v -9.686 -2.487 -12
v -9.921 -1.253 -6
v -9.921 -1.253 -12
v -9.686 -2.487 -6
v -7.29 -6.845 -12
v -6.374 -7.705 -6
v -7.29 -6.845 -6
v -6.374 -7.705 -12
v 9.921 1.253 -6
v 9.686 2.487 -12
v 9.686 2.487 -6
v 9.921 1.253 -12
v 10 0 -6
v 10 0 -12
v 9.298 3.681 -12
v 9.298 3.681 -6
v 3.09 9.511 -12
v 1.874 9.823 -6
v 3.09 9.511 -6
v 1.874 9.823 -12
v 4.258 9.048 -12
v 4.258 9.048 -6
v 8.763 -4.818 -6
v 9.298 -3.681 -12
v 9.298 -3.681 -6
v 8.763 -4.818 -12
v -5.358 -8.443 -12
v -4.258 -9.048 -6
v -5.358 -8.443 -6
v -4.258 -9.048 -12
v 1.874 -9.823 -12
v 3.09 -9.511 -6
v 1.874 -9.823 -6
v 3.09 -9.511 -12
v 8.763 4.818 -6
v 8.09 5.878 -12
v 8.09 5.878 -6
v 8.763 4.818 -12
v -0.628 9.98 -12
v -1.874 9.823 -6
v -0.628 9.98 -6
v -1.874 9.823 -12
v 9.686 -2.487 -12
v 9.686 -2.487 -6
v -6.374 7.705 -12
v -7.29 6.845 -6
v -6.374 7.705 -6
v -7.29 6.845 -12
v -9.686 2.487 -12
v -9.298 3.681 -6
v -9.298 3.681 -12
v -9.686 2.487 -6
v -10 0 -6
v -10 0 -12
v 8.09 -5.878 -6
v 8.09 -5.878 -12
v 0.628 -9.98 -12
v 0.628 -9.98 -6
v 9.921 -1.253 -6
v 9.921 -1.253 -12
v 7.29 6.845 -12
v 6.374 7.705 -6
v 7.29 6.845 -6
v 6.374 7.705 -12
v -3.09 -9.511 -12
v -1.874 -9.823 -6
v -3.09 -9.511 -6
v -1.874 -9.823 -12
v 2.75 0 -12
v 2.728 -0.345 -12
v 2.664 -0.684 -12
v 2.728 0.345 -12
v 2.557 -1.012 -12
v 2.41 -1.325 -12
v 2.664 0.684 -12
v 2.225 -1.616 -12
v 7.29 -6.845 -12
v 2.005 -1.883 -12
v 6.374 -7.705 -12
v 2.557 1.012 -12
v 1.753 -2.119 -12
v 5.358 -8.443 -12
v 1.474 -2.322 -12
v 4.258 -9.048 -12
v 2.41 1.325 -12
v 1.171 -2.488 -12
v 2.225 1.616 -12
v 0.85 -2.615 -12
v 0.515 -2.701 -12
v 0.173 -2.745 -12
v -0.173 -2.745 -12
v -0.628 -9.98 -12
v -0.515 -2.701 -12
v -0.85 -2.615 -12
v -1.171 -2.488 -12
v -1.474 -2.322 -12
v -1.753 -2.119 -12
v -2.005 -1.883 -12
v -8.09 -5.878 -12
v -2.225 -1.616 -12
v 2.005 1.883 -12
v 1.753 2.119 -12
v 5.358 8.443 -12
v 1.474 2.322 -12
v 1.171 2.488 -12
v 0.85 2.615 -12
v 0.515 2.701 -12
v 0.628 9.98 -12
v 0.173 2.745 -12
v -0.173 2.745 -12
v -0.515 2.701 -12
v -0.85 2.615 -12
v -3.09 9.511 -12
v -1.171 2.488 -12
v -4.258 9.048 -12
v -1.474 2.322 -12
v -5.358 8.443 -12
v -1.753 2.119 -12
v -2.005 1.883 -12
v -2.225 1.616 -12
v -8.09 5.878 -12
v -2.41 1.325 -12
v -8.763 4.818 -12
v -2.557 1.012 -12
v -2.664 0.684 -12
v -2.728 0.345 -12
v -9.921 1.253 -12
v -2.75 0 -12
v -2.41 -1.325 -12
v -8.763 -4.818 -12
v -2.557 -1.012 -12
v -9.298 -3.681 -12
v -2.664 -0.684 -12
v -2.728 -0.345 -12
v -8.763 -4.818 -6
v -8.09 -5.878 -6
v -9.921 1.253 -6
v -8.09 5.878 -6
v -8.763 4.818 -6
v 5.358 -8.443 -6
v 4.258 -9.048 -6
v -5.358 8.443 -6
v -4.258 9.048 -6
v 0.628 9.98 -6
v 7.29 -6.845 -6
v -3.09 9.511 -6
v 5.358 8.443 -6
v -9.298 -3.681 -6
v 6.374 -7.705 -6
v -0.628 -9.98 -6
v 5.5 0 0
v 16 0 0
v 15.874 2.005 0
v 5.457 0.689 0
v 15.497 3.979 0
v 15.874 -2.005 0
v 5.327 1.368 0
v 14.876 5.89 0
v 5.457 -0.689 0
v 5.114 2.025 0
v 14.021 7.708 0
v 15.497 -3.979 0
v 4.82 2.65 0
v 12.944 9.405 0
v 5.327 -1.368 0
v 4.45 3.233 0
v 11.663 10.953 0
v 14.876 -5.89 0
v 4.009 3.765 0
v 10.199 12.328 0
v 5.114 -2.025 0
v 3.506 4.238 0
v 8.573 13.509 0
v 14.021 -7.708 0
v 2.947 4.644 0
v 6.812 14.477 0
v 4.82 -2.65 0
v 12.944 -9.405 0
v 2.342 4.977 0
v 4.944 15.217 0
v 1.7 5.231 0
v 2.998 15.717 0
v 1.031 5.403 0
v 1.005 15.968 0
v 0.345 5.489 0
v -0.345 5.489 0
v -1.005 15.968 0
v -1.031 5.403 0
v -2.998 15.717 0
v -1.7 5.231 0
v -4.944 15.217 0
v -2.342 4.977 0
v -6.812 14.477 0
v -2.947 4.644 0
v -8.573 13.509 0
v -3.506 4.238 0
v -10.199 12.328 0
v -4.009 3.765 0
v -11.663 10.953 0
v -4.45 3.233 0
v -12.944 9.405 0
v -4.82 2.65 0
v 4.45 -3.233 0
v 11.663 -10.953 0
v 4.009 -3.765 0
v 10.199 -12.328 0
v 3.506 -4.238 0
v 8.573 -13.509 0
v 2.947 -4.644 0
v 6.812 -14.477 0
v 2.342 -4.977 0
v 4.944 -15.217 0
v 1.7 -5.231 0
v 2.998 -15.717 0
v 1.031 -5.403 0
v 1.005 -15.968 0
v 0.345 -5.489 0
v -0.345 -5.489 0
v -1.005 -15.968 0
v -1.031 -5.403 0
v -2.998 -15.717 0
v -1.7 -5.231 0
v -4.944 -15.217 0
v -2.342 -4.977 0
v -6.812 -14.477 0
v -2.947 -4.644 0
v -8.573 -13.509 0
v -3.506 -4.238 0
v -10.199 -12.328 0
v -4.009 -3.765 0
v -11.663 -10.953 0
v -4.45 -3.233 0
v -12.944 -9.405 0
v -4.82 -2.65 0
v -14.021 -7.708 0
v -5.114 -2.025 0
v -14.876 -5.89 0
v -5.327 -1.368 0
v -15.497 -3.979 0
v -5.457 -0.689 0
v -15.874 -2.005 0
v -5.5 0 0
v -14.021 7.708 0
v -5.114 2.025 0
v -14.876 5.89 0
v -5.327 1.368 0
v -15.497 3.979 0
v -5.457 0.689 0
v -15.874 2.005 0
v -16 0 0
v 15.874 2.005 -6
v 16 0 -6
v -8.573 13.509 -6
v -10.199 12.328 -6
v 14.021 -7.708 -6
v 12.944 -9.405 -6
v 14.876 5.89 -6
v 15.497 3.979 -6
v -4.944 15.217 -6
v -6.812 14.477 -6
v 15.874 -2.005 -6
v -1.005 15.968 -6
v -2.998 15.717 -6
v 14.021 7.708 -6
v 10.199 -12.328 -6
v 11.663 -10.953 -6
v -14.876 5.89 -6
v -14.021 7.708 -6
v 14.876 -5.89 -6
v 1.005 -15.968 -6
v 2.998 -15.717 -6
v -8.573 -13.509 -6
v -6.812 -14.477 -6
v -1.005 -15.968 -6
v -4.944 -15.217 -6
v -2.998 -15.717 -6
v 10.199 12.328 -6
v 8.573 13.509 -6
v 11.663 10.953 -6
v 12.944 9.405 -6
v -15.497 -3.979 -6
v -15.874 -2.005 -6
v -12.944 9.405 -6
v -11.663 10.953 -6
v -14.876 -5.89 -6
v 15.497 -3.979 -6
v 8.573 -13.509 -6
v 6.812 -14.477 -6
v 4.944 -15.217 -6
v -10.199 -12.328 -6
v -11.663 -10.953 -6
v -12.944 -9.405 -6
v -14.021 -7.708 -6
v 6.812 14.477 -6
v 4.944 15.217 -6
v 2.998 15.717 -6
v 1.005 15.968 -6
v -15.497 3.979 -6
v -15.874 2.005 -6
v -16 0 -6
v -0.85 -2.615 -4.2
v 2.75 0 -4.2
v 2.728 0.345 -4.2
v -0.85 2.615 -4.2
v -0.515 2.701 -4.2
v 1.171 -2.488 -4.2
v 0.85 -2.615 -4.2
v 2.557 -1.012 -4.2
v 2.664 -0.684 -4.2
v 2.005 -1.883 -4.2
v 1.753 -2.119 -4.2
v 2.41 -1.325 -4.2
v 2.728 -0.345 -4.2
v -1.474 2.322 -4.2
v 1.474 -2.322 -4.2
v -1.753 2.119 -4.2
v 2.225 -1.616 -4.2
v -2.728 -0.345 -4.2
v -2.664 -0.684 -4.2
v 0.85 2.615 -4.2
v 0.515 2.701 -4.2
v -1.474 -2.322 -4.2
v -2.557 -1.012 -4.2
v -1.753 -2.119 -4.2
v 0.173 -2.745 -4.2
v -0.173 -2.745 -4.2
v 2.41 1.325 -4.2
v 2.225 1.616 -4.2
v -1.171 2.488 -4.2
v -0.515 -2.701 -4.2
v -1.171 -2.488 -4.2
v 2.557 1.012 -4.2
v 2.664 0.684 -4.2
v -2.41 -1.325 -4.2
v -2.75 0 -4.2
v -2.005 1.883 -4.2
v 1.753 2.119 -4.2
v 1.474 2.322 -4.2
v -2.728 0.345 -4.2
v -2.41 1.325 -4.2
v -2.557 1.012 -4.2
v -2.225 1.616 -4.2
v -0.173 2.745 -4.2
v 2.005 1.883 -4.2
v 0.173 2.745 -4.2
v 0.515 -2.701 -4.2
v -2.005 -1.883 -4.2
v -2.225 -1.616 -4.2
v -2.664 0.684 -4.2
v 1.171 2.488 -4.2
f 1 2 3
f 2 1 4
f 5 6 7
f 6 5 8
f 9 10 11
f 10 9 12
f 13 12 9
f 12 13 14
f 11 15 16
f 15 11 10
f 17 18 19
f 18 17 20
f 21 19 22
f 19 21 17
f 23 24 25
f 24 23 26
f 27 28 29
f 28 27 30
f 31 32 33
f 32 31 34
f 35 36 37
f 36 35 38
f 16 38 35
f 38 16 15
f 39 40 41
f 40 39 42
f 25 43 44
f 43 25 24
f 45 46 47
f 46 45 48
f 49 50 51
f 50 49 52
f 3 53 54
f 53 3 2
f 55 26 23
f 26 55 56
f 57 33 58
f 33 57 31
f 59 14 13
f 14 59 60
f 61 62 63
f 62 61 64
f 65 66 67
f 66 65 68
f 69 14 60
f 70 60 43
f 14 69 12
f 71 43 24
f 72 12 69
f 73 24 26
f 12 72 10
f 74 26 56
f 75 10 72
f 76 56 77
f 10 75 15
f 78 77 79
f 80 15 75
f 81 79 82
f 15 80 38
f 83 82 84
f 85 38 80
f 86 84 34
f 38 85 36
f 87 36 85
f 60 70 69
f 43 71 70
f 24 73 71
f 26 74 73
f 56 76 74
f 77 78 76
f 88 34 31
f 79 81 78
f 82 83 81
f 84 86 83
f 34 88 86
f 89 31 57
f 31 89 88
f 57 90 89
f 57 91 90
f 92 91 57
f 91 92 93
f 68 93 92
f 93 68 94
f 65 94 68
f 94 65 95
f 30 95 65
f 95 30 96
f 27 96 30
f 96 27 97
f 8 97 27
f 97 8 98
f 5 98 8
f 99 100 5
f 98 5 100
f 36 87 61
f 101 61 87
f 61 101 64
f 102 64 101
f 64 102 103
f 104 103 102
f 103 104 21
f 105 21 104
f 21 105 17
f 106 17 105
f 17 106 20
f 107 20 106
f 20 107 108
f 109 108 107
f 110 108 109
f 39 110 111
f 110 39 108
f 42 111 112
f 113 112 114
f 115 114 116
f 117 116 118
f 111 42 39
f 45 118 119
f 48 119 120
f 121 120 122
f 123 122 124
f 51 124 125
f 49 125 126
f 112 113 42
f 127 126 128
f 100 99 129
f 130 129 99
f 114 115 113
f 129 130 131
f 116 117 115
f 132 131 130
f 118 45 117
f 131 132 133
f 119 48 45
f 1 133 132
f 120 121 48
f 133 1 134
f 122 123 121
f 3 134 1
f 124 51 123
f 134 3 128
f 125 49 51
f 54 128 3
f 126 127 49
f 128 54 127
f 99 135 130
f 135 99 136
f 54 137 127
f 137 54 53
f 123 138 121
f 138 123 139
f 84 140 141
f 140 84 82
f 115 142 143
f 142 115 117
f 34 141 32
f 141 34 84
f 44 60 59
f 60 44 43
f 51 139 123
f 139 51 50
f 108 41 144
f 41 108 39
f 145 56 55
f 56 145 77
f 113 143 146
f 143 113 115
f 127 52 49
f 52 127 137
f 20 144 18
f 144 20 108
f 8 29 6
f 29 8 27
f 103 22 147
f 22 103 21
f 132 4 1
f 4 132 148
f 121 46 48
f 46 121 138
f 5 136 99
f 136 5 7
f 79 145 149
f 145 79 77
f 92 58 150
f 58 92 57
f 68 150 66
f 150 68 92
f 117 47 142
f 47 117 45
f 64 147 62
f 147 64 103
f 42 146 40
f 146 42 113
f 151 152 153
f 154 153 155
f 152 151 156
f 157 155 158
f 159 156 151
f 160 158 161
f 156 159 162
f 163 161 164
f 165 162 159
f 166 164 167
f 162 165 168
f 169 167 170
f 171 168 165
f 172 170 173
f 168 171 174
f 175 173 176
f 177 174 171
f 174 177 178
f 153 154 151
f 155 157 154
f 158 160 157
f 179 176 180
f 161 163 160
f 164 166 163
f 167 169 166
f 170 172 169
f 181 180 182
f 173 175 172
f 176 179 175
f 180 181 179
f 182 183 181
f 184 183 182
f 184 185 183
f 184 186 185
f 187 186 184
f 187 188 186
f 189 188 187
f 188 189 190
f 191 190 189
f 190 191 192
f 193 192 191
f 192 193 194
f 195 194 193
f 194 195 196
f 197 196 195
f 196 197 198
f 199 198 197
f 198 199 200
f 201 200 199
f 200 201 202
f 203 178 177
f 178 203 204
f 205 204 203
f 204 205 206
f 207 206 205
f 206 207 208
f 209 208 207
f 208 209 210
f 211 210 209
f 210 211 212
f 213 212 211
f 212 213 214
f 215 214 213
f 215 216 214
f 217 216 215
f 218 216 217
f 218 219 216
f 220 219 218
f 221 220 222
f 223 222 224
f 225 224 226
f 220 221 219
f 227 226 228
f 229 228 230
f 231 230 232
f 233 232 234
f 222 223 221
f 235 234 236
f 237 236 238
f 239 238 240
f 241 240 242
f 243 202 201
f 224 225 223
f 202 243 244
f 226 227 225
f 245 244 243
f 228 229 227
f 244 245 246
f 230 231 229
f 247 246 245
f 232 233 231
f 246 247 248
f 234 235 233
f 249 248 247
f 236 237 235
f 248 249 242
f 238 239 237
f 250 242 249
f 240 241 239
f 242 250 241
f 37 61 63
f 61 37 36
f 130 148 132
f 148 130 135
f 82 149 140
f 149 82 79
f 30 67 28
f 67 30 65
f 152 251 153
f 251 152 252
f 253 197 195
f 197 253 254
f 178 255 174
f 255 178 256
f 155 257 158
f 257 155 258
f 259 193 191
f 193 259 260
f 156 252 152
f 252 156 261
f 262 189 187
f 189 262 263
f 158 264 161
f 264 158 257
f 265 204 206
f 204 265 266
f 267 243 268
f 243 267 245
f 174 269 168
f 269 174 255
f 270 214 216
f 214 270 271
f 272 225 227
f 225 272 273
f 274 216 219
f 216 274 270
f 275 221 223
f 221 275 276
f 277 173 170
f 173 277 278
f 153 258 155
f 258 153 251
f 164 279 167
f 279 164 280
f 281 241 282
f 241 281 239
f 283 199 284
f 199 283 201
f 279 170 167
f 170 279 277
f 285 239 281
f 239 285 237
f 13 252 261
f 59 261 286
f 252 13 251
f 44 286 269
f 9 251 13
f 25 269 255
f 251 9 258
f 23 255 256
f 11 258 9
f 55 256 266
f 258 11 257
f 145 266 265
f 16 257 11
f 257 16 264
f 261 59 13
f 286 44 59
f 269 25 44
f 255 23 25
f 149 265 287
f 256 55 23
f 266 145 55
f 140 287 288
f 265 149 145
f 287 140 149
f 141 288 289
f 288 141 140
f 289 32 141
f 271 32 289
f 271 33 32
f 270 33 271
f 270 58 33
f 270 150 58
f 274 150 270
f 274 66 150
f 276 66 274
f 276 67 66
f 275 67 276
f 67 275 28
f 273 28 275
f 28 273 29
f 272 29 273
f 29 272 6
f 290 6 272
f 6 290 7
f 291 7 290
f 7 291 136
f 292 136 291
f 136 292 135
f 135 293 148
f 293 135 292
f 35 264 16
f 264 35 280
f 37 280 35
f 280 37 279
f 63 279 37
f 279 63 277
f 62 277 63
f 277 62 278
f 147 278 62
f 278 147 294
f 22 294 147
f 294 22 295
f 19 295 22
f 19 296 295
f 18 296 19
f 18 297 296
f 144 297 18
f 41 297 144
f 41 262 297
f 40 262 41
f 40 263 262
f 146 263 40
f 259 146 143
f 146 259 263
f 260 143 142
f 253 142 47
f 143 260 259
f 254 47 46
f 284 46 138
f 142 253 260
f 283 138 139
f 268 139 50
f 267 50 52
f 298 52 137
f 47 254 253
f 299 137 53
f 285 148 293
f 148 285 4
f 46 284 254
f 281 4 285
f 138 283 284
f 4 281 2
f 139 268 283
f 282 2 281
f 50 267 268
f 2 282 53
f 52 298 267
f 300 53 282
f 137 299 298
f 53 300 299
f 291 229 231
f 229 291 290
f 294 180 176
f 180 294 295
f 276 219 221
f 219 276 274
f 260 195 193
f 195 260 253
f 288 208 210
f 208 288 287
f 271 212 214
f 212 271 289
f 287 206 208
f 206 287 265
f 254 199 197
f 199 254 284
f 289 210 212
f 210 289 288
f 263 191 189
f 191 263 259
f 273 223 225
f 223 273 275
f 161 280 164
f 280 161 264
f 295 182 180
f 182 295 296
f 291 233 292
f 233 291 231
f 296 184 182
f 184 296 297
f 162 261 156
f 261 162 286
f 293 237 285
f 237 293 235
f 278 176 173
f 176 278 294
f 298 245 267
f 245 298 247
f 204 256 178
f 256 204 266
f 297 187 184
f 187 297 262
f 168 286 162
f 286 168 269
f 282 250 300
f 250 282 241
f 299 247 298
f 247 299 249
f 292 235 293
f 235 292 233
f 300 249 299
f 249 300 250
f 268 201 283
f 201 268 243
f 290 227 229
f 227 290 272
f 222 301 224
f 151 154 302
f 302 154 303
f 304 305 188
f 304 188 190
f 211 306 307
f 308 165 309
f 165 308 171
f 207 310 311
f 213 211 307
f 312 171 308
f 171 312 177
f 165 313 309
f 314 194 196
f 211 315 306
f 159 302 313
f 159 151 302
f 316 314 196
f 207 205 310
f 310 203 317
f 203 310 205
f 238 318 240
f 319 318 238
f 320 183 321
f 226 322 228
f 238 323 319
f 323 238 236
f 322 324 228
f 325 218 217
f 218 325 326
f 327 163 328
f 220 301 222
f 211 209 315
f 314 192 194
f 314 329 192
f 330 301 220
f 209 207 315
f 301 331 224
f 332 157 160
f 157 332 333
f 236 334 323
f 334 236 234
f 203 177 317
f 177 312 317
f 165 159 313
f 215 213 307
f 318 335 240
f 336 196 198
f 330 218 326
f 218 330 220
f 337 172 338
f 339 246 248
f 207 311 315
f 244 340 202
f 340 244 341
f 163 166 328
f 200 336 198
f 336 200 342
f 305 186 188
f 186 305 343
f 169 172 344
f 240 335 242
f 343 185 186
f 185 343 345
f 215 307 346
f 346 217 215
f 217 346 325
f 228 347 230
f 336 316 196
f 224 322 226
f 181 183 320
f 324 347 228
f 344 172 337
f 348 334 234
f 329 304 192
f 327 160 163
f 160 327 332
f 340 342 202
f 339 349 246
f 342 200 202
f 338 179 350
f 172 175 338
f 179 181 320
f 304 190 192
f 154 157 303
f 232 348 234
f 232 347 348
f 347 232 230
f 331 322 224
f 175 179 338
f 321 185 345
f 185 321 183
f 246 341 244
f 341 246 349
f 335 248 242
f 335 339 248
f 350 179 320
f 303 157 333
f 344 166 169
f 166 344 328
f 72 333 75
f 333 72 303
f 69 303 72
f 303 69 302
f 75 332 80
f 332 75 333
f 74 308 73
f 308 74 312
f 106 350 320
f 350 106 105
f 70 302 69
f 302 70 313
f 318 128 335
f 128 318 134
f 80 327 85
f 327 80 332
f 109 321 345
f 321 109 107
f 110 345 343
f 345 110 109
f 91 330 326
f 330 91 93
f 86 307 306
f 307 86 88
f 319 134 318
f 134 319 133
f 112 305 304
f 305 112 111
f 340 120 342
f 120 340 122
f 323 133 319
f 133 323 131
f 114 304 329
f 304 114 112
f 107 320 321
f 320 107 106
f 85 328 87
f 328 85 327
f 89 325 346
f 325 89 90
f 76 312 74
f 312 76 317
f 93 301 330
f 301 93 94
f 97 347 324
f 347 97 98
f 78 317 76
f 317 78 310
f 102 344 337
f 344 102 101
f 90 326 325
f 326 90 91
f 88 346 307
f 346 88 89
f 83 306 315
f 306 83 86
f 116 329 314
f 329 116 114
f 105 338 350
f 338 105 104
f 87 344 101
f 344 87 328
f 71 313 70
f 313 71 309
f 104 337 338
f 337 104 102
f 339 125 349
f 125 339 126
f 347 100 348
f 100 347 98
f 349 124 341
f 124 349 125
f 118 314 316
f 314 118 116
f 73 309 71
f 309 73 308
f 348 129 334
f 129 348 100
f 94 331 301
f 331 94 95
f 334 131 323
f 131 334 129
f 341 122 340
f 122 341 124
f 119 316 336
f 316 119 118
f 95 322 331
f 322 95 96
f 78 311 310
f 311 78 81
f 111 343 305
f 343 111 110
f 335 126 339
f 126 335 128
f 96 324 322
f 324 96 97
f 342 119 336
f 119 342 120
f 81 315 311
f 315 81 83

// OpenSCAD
$fn = 50;


difference() {
	union() {
		translate(v = [0, 0, -12.0000000000]) {
			cylinder(h = 12, r = 10.0000000000);
		}
		translate(v = [0, 0, -6.0000000000]) {
			cylinder(h = 6, r = 16.0000000000);
		}
	}
	union() {
		translate(v = [0, 0, 0]) {
			rotate(a = [0, 0, 0]) {
				difference() {
					union() {
						#translate(v = [0, 0, -12.0000000000]) {
							cylinder(h = 12, r = 2.2500000000);
						}
						#translate(v = [0, 0, -4.2000000000]) {
							cylinder(h = 4.2000000000, r = 10.0000000000, r1 = 2.7500000000, r2 = 5.5000000000);
						}
						#translate(v = [0, 0, -12.0000000000]) {
							cylinder(h = 12, r = 2.7500000000);
						}
						#translate(v = [0, 0, -12.0000000000]) {
							cylinder(h = 12, r = 2.2500000000);
						}
					}
					union();
				}
			}
		}
	}
}
